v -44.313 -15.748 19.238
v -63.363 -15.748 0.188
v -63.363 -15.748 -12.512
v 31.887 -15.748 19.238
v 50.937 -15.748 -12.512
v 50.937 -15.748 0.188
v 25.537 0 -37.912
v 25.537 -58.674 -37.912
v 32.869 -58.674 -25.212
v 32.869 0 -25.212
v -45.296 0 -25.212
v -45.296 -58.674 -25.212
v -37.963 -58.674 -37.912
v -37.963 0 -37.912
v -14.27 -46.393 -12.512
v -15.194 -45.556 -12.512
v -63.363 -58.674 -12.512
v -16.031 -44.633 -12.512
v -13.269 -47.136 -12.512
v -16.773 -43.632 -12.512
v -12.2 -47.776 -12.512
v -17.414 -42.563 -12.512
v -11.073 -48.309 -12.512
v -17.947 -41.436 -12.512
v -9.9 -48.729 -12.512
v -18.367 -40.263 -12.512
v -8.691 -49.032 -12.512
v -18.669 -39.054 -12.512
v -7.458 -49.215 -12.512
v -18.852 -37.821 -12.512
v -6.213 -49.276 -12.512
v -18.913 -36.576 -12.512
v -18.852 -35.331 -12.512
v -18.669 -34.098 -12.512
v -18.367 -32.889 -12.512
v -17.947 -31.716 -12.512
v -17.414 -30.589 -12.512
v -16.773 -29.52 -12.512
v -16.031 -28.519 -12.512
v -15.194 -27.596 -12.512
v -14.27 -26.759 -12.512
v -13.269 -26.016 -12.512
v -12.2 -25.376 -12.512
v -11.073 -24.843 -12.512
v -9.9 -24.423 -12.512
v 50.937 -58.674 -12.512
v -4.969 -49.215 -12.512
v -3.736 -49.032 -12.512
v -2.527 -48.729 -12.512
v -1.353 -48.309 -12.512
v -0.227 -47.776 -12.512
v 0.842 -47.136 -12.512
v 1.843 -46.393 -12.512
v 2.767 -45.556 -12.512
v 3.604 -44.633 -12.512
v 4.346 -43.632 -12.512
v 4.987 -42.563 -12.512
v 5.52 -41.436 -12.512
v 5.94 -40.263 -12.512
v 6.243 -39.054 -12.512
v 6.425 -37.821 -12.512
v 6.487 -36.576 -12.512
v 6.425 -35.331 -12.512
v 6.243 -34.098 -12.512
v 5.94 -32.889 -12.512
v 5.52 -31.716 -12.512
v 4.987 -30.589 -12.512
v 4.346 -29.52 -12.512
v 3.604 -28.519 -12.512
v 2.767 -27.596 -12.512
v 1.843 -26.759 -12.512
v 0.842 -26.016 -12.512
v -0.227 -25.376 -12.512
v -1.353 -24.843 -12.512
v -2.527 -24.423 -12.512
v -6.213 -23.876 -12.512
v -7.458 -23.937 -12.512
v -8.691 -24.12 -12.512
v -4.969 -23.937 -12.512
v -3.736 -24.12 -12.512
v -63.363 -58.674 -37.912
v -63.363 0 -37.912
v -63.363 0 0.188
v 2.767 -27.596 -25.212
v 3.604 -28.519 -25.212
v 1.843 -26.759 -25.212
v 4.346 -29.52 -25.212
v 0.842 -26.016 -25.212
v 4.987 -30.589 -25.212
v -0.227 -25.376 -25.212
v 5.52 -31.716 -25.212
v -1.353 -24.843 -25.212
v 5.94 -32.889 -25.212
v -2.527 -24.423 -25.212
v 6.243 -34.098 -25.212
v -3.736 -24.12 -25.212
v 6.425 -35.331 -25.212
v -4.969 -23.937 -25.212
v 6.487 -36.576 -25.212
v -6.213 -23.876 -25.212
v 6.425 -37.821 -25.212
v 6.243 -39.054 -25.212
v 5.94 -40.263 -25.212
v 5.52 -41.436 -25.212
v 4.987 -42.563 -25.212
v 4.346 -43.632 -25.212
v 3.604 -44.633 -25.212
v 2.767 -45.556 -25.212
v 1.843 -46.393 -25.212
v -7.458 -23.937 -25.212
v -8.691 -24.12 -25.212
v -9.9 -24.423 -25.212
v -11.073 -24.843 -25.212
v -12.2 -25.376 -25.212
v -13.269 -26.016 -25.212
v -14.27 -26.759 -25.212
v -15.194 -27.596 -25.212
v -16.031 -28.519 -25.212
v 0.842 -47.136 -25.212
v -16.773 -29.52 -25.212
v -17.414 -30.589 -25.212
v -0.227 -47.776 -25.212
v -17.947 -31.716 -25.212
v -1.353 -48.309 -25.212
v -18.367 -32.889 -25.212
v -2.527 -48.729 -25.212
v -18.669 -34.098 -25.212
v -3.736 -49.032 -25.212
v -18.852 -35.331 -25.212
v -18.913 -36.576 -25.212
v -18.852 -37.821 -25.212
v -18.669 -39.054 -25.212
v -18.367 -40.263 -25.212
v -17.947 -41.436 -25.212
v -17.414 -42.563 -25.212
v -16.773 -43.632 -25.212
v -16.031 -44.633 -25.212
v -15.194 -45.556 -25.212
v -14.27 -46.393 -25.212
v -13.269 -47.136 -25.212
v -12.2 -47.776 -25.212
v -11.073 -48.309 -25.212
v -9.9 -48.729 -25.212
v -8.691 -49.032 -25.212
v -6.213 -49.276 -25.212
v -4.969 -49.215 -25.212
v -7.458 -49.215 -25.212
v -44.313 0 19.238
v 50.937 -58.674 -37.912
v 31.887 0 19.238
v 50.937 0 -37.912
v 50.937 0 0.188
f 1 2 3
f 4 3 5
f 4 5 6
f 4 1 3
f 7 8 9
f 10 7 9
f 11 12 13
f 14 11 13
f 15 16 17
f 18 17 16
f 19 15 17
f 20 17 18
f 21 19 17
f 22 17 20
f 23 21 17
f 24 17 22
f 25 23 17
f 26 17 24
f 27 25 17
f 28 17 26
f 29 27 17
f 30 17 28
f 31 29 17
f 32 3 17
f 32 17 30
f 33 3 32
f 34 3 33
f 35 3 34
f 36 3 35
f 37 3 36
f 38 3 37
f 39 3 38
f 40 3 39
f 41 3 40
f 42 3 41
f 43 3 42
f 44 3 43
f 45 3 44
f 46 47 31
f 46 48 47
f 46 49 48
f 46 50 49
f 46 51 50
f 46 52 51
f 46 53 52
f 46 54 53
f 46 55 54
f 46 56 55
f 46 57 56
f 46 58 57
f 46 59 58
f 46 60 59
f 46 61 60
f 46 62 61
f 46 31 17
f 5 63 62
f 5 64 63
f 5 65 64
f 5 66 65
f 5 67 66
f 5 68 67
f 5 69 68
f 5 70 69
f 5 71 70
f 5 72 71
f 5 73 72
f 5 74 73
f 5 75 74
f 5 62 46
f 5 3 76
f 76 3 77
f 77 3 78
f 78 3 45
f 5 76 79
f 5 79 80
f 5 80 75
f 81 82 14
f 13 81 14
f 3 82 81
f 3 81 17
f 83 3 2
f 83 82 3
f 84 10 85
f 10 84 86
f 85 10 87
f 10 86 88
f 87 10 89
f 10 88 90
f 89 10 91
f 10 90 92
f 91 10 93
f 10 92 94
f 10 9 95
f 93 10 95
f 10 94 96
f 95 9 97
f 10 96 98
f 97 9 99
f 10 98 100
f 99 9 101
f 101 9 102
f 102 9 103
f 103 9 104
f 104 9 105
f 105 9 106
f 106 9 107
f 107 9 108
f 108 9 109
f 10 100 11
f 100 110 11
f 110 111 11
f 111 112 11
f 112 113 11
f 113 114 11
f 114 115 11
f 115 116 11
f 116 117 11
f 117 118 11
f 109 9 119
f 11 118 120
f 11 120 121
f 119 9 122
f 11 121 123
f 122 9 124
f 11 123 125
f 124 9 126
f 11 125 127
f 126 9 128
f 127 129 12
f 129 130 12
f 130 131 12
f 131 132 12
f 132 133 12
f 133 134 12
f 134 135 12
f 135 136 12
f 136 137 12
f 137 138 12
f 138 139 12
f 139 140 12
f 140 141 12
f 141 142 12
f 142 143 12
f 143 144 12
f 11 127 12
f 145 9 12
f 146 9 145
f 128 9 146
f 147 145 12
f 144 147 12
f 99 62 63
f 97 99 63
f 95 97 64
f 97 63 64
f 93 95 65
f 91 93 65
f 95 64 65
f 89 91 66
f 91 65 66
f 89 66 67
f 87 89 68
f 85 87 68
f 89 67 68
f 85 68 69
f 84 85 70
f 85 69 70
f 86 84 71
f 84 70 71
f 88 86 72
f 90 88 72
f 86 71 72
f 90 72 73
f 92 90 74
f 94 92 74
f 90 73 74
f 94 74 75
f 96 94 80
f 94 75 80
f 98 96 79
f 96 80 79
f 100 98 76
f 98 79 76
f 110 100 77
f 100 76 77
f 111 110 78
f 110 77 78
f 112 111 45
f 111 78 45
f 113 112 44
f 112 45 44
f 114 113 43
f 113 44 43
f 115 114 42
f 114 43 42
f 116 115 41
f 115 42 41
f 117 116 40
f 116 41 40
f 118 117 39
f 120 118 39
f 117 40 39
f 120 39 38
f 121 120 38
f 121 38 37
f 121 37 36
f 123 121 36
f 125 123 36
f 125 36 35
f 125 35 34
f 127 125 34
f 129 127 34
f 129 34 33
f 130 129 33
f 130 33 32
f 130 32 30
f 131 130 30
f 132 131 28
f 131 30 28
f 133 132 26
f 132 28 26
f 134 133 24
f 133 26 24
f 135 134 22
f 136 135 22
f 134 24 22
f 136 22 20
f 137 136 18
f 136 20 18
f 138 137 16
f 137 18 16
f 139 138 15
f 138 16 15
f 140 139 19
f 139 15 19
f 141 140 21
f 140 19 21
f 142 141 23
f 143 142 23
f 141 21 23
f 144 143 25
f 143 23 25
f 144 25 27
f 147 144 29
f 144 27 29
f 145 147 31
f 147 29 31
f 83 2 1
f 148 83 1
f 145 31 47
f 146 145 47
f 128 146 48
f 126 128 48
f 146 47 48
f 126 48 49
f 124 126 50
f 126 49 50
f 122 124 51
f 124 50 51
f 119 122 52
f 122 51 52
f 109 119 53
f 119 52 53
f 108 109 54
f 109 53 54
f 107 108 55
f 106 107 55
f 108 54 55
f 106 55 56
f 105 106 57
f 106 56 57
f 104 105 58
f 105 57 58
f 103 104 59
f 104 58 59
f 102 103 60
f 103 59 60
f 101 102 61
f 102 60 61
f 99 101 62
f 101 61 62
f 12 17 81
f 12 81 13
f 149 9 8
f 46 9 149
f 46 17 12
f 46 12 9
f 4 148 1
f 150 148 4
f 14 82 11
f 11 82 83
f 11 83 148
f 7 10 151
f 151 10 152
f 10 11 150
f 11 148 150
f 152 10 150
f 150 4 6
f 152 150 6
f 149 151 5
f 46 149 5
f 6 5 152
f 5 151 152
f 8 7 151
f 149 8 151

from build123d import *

# Parameters (mm, degrees)
F0_W     = 114.3
F0_H     = 57.15
F1_DEPTH = 58.674
F2_W     = 114.3
F2_H     = 42.926
F3_DEPTH = 31.75
F5_DEPTH = 15.748
F7_DEPTH = 58.674
F9_DEPTH = 12.7


with BuildPart() as f1:
    # F0 (on Front) → F1 (new body)
    with BuildSketch(Plane.XZ):
        with Locations((-6.213398, -9.336713)):
            Rectangle(F0_W, F0_H)
    extrude(amount=F1_DEPTH)

    # F2 (on face) → F3 (cut)
    with BuildSketch(Plane.XY.offset(19.238287)):
        with Locations((-6.213398, -37.211)):
            Rectangle(F2_W, F2_H)
    extrude(amount=-F3_DEPTH, mode=Mode.SUBTRACT)

    # F4 (on face) → F5 (cut)
    with BuildSketch(Plane.XZ.offset(15.748)):
        Polygon((50.936602, 19.238287), (31.886602, 19.238287), (50.936602, 0.188287), align=None)
        Polygon((-44.313398, 19.238287), (-63.363398, 19.238287), (-63.363398, 0.188287), align=None)
    extrude(amount=-F5_DEPTH, mode=Mode.SUBTRACT)

    # F6 (on face) → F7 (cut)
    with BuildSketch(Plane.XZ.offset(58.674)):
        Polygon((-37.963398, -37.911713), (25.536602, -37.911713), (32.86895, -25.211713), (25.536602, -25.211713), (-37.963398, -25.211713), (-45.295746, -25.211713), align=None)
    extrude(amount=-F7_DEPTH, mode=Mode.SUBTRACT)

    # F8 (on face) → F9 (cut)
    with BuildSketch(Plane.XY.offset(-12.511713)):
        with BuildLine():
            ThreePointArc((6.486602, -36.576), (-15.193654, -27.595744), (-6.213398, -49.276))
            ThreePointArc((-6.213398, -49.276), (2.766858, -45.556256), (6.486602, -36.576))
        make_face()
    extrude(amount=-F9_DEPTH, mode=Mode.SUBTRACT)


solid = f1.part
